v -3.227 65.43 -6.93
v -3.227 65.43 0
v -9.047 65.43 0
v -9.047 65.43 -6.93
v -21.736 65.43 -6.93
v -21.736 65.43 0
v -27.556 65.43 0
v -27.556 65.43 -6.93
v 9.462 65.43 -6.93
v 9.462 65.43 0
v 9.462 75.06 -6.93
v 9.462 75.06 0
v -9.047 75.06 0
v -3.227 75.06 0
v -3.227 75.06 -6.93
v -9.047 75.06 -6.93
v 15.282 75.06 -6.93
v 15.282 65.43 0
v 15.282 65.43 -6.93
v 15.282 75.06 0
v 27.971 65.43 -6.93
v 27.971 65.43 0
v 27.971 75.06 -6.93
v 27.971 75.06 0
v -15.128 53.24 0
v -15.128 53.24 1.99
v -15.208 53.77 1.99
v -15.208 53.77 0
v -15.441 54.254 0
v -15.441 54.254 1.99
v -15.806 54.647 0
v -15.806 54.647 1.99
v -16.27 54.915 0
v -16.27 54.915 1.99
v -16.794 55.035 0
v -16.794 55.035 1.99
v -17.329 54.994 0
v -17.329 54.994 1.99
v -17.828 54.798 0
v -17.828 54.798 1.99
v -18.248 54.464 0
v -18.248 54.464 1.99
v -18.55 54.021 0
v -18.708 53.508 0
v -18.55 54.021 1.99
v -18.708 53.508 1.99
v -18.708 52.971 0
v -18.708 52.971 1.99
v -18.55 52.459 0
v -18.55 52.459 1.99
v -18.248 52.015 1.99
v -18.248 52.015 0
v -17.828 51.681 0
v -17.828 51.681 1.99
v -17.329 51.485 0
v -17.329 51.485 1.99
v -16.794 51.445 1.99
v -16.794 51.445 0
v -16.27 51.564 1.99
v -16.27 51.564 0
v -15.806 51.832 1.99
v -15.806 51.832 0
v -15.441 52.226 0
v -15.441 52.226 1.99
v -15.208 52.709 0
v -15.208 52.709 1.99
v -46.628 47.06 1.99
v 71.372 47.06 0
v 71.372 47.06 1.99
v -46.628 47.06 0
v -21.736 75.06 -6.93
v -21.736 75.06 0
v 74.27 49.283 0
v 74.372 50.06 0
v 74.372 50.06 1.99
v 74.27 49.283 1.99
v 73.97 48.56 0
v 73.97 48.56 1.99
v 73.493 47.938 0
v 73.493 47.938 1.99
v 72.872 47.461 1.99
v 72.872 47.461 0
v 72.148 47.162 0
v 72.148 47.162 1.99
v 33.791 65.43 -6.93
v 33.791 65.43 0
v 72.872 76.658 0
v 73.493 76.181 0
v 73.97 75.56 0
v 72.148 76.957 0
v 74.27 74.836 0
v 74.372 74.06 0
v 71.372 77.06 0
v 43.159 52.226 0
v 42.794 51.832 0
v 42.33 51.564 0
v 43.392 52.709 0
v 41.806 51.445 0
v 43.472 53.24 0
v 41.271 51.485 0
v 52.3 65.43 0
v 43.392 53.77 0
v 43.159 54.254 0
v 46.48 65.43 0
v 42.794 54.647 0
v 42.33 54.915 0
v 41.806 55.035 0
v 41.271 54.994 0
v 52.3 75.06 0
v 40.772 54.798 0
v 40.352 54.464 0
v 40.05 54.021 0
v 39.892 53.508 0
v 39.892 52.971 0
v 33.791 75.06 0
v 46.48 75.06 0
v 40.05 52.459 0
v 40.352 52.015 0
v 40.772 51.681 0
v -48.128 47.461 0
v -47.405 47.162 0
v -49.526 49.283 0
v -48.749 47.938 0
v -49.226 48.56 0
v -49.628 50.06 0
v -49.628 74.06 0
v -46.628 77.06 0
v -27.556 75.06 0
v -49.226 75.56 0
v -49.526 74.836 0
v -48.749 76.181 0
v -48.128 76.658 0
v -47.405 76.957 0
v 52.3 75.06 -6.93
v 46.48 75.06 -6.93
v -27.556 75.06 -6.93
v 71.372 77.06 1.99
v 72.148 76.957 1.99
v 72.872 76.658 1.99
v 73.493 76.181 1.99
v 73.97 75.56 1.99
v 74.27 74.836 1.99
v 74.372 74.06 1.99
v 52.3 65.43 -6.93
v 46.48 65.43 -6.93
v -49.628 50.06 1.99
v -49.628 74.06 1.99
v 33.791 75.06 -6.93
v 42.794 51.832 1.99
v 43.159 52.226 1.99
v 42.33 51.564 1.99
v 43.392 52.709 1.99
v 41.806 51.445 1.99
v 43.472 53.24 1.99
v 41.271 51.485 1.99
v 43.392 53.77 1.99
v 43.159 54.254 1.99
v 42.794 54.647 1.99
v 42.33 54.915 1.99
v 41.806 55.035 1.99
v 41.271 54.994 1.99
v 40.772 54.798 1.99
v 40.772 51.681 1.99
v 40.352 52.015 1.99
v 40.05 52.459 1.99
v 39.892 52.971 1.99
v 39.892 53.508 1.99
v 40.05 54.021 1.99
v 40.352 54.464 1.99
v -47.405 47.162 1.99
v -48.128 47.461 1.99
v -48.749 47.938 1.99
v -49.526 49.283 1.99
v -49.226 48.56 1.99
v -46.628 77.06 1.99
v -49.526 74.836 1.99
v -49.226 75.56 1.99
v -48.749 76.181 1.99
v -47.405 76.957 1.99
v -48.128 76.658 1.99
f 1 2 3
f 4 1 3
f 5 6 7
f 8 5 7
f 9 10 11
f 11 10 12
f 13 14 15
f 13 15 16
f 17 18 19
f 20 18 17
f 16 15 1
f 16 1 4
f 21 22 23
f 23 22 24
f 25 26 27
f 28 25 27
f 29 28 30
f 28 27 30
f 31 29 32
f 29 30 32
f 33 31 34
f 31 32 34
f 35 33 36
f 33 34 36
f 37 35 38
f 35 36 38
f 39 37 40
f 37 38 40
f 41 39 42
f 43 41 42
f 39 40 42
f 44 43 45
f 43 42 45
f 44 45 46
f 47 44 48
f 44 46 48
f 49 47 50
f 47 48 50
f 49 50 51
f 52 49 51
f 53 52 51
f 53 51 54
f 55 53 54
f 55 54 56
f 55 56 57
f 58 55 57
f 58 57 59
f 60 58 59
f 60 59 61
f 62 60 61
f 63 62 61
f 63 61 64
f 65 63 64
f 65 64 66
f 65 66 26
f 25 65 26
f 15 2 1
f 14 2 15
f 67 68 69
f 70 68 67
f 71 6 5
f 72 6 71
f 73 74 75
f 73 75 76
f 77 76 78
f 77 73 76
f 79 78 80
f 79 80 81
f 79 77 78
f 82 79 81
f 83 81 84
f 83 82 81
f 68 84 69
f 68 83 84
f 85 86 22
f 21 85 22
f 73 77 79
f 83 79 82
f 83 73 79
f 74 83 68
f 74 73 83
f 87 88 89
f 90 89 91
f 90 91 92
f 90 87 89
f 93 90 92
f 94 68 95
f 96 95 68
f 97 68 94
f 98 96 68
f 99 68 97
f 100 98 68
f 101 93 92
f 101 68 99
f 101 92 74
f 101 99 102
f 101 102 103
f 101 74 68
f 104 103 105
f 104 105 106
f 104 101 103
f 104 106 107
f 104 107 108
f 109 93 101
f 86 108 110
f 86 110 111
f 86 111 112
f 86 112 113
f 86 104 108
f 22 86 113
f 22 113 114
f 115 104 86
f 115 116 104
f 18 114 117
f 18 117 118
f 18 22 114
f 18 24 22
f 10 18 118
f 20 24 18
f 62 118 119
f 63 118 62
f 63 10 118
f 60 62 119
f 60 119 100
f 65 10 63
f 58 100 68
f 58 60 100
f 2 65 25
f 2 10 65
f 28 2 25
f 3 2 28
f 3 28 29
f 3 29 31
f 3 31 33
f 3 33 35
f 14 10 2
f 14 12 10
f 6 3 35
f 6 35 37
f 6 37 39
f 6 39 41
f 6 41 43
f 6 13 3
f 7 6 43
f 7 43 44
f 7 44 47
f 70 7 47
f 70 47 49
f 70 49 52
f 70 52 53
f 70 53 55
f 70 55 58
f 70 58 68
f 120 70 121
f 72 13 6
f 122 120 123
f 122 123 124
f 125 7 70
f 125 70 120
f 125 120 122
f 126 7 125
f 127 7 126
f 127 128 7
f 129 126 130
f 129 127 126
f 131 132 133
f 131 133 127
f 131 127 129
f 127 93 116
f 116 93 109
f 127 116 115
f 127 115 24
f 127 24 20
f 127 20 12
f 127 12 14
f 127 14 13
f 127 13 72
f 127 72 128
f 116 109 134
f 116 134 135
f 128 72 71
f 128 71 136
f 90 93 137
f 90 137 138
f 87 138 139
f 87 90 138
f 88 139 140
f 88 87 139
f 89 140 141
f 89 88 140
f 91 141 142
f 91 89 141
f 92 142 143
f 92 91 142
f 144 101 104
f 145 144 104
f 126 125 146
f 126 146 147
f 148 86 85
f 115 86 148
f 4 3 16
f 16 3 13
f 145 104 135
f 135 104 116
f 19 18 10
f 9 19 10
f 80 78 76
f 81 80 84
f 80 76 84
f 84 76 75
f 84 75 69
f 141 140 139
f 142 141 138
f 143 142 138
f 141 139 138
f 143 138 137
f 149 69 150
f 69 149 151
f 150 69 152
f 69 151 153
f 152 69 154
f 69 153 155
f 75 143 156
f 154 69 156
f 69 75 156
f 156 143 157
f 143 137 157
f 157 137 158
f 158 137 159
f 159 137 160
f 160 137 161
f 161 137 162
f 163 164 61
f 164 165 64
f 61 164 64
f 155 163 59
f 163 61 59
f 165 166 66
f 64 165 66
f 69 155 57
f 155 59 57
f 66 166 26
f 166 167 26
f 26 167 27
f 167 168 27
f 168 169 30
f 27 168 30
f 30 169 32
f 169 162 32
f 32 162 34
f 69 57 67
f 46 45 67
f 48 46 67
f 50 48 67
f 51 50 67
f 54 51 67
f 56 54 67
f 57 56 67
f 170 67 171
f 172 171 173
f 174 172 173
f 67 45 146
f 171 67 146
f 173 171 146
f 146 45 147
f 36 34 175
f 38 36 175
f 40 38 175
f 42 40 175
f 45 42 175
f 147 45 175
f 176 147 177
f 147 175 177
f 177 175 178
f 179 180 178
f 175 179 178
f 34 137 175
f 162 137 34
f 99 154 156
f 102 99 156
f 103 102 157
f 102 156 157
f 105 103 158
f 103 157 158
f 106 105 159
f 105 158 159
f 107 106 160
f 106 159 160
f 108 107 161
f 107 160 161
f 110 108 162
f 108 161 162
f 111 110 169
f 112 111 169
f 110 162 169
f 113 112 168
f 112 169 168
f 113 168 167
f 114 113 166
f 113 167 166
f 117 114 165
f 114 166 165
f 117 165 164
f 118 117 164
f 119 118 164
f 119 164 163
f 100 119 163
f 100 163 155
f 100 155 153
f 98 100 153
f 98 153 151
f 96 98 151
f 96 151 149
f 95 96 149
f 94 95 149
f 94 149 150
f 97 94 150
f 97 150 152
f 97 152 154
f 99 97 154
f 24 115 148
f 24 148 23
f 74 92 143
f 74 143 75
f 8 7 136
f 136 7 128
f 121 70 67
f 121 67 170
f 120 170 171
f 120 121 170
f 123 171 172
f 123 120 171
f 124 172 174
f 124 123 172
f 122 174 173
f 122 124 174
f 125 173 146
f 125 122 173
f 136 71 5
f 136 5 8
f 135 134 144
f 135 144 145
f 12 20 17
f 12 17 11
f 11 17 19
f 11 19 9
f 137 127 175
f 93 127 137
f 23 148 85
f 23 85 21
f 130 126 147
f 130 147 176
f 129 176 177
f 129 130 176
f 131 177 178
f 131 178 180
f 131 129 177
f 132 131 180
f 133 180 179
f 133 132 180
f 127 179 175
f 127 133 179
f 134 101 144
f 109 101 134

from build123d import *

# Parameters (mm, degrees)
BOSS_EXTRU_1_DEPTH             = 1.99
ESQUISSE3_W                    = 5.82
ESQUISSE3_H                    = 9.63
BOSS_EXTRU_5_DEPTH             = 6.93
R_P_TITION_LIN_AIRE2_COUNT     = 3
R_P_TITION_LIN_AIRE2_PITCH     = 18.509
R_P_TITION_LIN_AIRE2_COL_COUNT = 3
R_P_TITION_LIN_AIRE2_COL_PITCH = 18.509
D_GAGEMENT_M31_D               = 3.6


with BuildPart() as part:
    # Esquisse2 → Boss.-Extru.1 (new body)
    with BuildSketch(Plane.XY):
        with BuildLine():
            Line((-46.628094051, 77.059557029), (71.371905949, 77.059557029))
            ThreePointArc((71.371905949, 77.059557029), (73.493226293, 76.180877372), (74.371905949, 74.059557029))
            Line((74.371905949, 74.059557029), (74.371905949, 50.059557029))
            ThreePointArc((74.371905949, 50.059557029), (73.493226293, 47.938236685), (71.371905949, 47.059557029))
            Line((71.371905949, 47.059557029), (-46.628094051, 47.059557029))
            ThreePointArc((-46.628094051, 47.059557029), (-48.749414394, 47.938236685), (-49.628094051, 50.059557029))
            Line((-49.628094051, 50.059557029), (-49.628094051, 74.059557029))
            ThreePointArc((-49.628094051, 74.059557029), (-48.749414394, 76.180877372), (-46.628094051, 77.059557029))
        make_face()
    extrude(amount=BOSS_EXTRU_1_DEPTH)

    # Esquisse3 → Boss.-Extru.5 (add)
    with BuildSketch(Plane(origin=(0, 0, 0), x_dir=(-1, 0, 0), z_dir=(0, 0, -1))):
        with Locations((-12.371905949, 70.244557029)):
            Rectangle(ESQUISSE3_W, ESQUISSE3_H)
    boss_extru_5 = extrude(amount=BOSS_EXTRU_5_DEPTH)

    # Répétition linéaire2: Boss.-Extru.5 ×3
    with Locations(*[(-i * R_P_TITION_LIN_AIRE2_PITCH, 0, 0) for i in range(1, R_P_TITION_LIN_AIRE2_COUNT)]):
        add(boss_extru_5)

    # Répétition linéaire2 col: Boss.-Extru.5 ×3
    with Locations(*[(i * R_P_TITION_LIN_AIRE2_COL_PITCH, 0, 0) for i in range(1, R_P_TITION_LIN_AIRE2_COL_COUNT)]):
        add(boss_extru_5)

    # Dégagement M31 (through all)
    with Locations(Plane(origin=(0, 0, 0), x_dir=(-1, 0, 0), z_dir=(0, 0, -1))):
        with Locations((-41.671905949, 53.239557029), (16.928094051, 53.239557029)):
            Hole(D_GAGEMENT_M31_D / 2)


solid = part.part
